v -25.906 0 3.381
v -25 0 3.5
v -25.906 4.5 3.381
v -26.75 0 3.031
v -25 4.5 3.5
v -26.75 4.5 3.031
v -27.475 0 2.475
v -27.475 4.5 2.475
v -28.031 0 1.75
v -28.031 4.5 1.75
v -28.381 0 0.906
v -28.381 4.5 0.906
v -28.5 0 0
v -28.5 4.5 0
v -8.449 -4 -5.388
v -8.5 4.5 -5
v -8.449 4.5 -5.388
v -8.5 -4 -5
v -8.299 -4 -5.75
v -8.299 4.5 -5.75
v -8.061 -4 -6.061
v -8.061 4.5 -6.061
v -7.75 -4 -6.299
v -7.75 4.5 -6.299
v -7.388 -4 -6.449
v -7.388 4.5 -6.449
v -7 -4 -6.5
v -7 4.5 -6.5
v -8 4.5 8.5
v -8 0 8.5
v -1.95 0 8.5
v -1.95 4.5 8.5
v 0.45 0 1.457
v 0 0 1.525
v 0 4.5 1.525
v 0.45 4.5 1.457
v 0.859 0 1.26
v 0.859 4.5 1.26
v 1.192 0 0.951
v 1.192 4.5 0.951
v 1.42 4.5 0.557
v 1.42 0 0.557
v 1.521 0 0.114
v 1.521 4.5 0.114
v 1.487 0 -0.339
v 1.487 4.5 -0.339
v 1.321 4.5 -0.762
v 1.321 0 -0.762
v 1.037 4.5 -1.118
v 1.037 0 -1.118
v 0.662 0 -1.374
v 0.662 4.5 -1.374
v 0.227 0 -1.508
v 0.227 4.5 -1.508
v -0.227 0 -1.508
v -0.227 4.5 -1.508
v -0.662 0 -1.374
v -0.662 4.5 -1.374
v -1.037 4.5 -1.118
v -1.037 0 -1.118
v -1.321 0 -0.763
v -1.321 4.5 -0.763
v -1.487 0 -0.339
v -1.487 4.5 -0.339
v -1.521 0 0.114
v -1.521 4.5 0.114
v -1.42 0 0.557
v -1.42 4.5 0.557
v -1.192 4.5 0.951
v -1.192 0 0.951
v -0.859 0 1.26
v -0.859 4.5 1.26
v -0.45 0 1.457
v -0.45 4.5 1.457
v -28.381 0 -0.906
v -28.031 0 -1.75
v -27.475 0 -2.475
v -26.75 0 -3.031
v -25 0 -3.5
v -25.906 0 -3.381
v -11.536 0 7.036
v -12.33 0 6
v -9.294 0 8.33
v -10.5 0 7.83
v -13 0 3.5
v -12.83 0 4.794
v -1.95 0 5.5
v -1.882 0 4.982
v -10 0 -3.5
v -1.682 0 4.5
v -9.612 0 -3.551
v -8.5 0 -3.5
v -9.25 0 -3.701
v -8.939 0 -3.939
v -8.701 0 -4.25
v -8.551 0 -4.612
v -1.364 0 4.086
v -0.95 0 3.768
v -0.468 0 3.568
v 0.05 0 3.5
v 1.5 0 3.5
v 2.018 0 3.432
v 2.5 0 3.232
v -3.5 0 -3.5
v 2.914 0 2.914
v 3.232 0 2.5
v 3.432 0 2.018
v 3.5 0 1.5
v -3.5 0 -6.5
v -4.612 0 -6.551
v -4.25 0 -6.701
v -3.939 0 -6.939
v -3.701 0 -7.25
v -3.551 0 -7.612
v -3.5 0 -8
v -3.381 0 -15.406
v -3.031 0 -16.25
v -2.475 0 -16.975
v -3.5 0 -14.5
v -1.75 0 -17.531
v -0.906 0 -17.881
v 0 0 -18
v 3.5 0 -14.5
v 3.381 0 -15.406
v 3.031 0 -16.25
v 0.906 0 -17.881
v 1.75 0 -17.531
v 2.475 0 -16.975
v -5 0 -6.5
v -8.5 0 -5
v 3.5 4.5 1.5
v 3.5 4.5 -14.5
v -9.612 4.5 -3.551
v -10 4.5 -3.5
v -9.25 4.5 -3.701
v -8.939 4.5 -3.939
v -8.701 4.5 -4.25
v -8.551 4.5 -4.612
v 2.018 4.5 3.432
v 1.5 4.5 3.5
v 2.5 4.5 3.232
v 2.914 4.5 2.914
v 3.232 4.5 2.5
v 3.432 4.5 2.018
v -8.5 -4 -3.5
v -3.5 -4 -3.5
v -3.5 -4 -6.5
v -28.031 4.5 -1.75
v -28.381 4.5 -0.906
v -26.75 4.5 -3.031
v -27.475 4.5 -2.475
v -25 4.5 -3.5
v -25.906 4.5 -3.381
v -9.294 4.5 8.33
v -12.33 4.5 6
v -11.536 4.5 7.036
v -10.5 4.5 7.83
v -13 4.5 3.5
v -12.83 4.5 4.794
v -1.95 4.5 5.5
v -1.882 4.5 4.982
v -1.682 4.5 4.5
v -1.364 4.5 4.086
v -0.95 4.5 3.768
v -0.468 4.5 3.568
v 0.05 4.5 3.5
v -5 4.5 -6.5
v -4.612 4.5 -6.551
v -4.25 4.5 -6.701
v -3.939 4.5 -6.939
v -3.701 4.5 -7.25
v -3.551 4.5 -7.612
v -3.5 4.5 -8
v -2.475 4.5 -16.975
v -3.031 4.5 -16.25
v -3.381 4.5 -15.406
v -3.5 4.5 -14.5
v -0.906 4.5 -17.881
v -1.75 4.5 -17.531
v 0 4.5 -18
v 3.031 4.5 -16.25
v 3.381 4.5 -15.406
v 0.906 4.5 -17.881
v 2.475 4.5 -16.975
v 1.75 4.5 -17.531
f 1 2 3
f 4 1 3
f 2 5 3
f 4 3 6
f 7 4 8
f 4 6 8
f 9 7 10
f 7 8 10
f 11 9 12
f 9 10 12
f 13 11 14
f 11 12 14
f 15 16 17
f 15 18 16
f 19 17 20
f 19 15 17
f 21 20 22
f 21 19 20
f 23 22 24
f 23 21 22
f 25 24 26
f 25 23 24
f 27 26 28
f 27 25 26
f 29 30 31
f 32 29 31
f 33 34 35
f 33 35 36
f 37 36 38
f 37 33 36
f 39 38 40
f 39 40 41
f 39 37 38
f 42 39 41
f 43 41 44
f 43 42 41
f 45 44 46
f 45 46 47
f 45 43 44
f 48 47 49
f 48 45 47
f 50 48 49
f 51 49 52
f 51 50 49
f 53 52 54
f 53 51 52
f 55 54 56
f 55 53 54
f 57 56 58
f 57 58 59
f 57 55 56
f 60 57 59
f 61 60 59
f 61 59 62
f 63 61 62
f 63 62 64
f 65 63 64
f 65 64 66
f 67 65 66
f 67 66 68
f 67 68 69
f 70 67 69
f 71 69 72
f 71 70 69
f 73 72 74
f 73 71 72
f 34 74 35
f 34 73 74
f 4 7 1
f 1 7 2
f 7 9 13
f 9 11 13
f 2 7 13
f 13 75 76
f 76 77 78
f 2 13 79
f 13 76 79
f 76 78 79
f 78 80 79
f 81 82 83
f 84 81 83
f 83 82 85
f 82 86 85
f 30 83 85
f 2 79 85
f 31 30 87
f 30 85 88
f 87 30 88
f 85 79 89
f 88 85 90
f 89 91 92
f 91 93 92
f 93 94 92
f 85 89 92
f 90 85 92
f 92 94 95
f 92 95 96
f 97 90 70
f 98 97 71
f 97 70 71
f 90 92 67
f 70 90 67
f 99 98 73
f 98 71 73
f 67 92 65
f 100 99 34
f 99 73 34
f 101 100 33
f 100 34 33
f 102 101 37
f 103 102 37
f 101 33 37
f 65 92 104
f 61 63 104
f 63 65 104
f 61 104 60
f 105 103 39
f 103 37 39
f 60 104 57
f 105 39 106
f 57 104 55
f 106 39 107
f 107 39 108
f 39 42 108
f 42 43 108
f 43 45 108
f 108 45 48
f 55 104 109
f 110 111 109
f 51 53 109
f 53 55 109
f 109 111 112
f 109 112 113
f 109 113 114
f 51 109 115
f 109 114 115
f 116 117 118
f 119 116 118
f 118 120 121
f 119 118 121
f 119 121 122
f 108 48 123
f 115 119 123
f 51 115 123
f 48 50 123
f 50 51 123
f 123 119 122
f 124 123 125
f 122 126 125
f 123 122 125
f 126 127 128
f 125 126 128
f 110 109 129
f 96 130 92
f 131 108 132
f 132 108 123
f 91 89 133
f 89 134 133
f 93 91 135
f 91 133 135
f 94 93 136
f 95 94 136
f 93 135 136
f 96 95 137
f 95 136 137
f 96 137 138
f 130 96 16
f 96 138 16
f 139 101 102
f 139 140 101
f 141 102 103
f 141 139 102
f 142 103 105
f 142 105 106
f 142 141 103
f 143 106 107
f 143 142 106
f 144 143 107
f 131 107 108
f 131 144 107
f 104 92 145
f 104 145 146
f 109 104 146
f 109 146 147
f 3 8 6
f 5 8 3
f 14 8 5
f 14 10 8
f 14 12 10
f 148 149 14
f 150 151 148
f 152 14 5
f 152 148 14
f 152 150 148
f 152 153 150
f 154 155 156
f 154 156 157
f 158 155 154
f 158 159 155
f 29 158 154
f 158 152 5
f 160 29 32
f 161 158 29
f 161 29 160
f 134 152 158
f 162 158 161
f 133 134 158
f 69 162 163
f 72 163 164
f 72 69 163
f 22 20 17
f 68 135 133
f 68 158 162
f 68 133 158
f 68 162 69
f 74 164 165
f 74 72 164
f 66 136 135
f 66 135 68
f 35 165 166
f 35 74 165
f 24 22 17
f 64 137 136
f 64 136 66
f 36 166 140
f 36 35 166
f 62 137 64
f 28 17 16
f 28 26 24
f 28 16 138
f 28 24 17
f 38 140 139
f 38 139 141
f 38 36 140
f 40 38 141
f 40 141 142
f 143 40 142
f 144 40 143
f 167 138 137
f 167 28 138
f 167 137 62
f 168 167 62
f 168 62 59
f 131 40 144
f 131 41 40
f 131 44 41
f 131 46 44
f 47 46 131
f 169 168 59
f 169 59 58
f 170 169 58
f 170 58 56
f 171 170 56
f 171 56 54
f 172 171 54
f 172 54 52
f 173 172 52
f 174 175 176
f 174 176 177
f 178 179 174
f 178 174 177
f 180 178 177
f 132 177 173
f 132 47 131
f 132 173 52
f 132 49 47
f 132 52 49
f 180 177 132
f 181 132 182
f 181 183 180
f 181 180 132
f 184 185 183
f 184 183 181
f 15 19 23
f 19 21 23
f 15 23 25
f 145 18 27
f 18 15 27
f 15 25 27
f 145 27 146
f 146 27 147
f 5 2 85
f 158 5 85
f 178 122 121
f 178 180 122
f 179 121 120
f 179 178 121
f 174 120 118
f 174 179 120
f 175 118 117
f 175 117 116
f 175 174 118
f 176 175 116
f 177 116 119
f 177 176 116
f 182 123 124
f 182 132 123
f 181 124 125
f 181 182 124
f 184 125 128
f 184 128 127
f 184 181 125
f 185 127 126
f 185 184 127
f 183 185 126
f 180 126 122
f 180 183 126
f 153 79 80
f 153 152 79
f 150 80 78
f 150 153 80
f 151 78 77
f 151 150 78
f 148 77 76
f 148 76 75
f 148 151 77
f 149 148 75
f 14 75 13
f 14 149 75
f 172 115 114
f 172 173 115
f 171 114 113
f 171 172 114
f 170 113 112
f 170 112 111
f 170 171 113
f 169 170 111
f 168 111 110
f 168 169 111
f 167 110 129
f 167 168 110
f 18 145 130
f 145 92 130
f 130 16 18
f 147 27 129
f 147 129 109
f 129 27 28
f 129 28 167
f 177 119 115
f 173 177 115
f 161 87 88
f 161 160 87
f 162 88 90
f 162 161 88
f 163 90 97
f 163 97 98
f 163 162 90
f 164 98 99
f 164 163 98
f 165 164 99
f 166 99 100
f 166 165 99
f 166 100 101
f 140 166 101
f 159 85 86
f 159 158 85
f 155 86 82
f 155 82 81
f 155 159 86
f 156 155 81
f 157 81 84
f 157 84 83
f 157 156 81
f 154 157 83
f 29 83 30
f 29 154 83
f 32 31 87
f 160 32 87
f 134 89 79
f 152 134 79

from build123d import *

# Parameters (mm, degrees)
SKETCH_1_R      = 1.525
EXTRUDE_1_DEPTH = 4.5
SKETCH_2_W      = 5
SKETCH_2_H      = 3
EXTRUDE_2_DEPTH = 4
FILLET_1_R      = 3.5
FILLET_3_R      = 1.5
FILLET_4_R      = 5
FILLET_5_R      = 2


with BuildPart() as part:
    # 草图1 → 凸台-拉伸1 (new body)
    with BuildSketch(Plane(origin=(0, 0, 0), x_dir=(1, 0, 0), z_dir=(0, 1, 0))):
        Polygon((3.5, -3.5), (3.5, 18), (-3.5, 18), (-3.5, 6.5), (-8.5, 6.5), (-8.5, 3.5), (-28.5, 3.5), (-28.5, -3.5), (-13, -3.5), (-13, -8.5), (-7.55, -8.5), (-1.95, -8.5), (-1.95, -3.5), align=None)
        with Locations(Location((0, 0, 0), (0, 0, 270))):
            Circle(SKETCH_1_R, mode=Mode.SUBTRACT)
    extrude(amount=EXTRUDE_1_DEPTH)

    # 草图2 → 凸台-拉伸2 (add)
    with BuildSketch(Plane(origin=(0, 0, 0), x_dir=(1, 0, 0), z_dir=(0, 1, 0))):
        with Locations((-6, 5)):
            Rectangle(SKETCH_2_W, SKETCH_2_H)
    extrude(amount=-EXTRUDE_2_DEPTH)

    # 圆角1
    fillet_1_edges = [part.edges().sort_by_distance(p)[0] for p in [
        (3.5, 2.25, -18),
        (-3.5, 2.25, -18),
        (-28.5, 2.25, 3.5),
        (-28.5, 2.25, -3.5),
    ]]
    fillet(fillet_1_edges, radius=FILLET_1_R - 0.0001)  # a hair under: the kernel refuses the full size

    # 圆角3
    fillet_3_edges = [part.edges().sort_by_distance(p)[0] for p in [
        (-8.5, 2.25, -3.5),
        (-8.5, 0.25, -6.5),
        (-3.5, 2.25, -6.5),
    ]]
    fillet(fillet_3_edges, radius=FILLET_3_R - 0.0001)  # a hair under: the kernel refuses the full size

    # 圆角4
    fillet_4_edges = [part.edges().sort_by_distance(p)[0] for p in [
        (-13, 2.25, 8.5),
    ]]
    fillet(fillet_4_edges, radius=FILLET_4_R - 0.0001)  # a hair under: the kernel refuses the full size

    # 圆角5
    fillet_5_edges = [part.edges().sort_by_distance(p)[0] for p in [
        (3.5, 2.25, 3.5),
        (-1.95, 2.25, 3.5),
    ]]
    fillet(fillet_5_edges, radius=FILLET_5_R)


solid = part.part
